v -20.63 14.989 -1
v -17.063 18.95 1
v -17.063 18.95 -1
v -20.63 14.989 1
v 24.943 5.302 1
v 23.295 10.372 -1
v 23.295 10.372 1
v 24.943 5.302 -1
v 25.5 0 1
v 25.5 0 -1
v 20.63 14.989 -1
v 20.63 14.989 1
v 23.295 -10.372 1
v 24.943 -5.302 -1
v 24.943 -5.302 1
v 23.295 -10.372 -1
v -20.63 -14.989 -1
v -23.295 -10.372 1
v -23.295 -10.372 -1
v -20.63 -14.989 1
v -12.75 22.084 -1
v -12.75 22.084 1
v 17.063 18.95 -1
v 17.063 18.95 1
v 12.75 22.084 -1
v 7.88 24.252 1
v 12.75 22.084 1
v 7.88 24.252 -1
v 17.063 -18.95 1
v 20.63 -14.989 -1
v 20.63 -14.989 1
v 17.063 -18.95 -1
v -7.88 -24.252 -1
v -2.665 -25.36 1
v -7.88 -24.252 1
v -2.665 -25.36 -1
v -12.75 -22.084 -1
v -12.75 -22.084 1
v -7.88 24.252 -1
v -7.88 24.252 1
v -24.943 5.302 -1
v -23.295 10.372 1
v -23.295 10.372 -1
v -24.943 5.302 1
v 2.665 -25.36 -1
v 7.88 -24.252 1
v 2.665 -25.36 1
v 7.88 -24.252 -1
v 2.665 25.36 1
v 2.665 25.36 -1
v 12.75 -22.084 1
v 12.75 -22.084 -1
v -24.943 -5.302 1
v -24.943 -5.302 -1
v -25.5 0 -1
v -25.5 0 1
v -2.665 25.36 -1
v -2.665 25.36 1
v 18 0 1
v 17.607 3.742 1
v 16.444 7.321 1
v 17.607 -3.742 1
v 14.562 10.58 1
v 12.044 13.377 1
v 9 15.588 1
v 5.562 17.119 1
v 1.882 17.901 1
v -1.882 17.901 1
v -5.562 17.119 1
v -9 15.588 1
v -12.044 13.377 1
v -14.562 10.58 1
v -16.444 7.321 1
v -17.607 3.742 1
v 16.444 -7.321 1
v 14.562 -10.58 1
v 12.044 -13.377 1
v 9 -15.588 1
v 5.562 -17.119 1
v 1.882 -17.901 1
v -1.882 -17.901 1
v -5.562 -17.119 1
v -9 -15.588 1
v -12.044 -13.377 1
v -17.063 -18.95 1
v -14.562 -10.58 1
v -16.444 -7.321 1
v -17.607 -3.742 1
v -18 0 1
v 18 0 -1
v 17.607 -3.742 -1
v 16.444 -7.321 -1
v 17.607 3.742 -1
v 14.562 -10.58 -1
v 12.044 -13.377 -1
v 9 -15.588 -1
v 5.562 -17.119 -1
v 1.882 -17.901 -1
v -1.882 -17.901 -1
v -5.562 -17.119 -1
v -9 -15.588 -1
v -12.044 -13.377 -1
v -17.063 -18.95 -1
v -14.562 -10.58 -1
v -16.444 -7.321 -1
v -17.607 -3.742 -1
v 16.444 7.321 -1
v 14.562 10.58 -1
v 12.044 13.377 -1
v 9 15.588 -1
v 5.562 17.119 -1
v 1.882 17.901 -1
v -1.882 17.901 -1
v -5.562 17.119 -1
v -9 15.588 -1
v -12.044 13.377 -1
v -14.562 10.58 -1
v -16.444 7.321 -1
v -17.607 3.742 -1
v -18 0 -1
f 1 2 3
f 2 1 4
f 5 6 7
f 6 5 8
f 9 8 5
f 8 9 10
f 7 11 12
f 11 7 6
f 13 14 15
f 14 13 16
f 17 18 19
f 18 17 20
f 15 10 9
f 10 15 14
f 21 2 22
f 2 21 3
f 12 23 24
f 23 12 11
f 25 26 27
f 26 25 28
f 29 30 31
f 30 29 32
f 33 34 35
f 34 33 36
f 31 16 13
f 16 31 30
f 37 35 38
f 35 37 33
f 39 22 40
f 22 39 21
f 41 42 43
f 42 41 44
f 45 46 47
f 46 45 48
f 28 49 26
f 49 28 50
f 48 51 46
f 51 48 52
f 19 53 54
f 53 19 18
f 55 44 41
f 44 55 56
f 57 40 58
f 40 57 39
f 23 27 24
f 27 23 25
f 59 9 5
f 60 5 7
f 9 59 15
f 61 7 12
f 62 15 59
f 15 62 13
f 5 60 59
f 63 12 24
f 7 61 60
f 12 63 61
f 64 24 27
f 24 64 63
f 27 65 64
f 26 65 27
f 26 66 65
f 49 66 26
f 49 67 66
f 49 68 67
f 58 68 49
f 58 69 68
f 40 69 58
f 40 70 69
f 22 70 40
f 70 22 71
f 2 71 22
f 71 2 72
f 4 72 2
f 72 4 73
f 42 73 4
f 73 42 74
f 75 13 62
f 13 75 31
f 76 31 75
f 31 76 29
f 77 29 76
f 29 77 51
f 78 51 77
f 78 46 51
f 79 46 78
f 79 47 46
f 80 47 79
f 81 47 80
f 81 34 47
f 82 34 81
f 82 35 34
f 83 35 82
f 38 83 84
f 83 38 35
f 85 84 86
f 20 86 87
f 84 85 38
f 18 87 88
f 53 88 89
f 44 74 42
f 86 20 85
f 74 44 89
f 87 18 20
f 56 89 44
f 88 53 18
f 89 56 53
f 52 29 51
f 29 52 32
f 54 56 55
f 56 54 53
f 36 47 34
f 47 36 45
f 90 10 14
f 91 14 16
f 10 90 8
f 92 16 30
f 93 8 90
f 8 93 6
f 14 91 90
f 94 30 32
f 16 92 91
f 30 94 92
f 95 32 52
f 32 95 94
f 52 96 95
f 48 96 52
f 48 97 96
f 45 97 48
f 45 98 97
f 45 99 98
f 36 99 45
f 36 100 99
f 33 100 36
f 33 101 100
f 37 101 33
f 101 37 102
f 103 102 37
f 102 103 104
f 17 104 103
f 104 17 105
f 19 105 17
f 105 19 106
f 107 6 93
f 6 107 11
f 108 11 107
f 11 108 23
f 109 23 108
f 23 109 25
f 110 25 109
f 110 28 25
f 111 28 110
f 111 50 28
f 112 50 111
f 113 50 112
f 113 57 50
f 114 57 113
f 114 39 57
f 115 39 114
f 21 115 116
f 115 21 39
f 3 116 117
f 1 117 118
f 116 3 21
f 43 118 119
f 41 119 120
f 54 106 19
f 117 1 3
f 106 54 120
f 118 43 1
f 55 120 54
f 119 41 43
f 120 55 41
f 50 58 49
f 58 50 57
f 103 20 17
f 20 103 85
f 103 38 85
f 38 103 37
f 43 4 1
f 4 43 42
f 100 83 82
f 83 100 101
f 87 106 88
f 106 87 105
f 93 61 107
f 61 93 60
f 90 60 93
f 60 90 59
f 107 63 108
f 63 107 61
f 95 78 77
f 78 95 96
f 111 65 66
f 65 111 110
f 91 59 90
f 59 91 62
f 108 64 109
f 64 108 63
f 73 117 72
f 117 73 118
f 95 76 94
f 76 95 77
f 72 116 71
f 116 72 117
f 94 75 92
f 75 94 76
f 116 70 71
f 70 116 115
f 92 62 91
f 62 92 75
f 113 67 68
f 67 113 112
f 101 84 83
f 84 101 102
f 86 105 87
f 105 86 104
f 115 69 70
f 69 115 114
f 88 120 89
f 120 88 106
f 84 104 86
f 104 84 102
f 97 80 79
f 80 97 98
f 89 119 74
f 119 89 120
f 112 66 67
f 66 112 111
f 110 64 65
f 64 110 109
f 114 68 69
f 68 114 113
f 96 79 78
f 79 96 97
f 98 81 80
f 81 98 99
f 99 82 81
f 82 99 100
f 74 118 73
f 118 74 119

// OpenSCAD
//bearing 51104 dimensions 20-35-10

difference(){
	cylinder(r=25.5,h=2,center=true);
	cylinder(r=18,h=3,center=true);
}
